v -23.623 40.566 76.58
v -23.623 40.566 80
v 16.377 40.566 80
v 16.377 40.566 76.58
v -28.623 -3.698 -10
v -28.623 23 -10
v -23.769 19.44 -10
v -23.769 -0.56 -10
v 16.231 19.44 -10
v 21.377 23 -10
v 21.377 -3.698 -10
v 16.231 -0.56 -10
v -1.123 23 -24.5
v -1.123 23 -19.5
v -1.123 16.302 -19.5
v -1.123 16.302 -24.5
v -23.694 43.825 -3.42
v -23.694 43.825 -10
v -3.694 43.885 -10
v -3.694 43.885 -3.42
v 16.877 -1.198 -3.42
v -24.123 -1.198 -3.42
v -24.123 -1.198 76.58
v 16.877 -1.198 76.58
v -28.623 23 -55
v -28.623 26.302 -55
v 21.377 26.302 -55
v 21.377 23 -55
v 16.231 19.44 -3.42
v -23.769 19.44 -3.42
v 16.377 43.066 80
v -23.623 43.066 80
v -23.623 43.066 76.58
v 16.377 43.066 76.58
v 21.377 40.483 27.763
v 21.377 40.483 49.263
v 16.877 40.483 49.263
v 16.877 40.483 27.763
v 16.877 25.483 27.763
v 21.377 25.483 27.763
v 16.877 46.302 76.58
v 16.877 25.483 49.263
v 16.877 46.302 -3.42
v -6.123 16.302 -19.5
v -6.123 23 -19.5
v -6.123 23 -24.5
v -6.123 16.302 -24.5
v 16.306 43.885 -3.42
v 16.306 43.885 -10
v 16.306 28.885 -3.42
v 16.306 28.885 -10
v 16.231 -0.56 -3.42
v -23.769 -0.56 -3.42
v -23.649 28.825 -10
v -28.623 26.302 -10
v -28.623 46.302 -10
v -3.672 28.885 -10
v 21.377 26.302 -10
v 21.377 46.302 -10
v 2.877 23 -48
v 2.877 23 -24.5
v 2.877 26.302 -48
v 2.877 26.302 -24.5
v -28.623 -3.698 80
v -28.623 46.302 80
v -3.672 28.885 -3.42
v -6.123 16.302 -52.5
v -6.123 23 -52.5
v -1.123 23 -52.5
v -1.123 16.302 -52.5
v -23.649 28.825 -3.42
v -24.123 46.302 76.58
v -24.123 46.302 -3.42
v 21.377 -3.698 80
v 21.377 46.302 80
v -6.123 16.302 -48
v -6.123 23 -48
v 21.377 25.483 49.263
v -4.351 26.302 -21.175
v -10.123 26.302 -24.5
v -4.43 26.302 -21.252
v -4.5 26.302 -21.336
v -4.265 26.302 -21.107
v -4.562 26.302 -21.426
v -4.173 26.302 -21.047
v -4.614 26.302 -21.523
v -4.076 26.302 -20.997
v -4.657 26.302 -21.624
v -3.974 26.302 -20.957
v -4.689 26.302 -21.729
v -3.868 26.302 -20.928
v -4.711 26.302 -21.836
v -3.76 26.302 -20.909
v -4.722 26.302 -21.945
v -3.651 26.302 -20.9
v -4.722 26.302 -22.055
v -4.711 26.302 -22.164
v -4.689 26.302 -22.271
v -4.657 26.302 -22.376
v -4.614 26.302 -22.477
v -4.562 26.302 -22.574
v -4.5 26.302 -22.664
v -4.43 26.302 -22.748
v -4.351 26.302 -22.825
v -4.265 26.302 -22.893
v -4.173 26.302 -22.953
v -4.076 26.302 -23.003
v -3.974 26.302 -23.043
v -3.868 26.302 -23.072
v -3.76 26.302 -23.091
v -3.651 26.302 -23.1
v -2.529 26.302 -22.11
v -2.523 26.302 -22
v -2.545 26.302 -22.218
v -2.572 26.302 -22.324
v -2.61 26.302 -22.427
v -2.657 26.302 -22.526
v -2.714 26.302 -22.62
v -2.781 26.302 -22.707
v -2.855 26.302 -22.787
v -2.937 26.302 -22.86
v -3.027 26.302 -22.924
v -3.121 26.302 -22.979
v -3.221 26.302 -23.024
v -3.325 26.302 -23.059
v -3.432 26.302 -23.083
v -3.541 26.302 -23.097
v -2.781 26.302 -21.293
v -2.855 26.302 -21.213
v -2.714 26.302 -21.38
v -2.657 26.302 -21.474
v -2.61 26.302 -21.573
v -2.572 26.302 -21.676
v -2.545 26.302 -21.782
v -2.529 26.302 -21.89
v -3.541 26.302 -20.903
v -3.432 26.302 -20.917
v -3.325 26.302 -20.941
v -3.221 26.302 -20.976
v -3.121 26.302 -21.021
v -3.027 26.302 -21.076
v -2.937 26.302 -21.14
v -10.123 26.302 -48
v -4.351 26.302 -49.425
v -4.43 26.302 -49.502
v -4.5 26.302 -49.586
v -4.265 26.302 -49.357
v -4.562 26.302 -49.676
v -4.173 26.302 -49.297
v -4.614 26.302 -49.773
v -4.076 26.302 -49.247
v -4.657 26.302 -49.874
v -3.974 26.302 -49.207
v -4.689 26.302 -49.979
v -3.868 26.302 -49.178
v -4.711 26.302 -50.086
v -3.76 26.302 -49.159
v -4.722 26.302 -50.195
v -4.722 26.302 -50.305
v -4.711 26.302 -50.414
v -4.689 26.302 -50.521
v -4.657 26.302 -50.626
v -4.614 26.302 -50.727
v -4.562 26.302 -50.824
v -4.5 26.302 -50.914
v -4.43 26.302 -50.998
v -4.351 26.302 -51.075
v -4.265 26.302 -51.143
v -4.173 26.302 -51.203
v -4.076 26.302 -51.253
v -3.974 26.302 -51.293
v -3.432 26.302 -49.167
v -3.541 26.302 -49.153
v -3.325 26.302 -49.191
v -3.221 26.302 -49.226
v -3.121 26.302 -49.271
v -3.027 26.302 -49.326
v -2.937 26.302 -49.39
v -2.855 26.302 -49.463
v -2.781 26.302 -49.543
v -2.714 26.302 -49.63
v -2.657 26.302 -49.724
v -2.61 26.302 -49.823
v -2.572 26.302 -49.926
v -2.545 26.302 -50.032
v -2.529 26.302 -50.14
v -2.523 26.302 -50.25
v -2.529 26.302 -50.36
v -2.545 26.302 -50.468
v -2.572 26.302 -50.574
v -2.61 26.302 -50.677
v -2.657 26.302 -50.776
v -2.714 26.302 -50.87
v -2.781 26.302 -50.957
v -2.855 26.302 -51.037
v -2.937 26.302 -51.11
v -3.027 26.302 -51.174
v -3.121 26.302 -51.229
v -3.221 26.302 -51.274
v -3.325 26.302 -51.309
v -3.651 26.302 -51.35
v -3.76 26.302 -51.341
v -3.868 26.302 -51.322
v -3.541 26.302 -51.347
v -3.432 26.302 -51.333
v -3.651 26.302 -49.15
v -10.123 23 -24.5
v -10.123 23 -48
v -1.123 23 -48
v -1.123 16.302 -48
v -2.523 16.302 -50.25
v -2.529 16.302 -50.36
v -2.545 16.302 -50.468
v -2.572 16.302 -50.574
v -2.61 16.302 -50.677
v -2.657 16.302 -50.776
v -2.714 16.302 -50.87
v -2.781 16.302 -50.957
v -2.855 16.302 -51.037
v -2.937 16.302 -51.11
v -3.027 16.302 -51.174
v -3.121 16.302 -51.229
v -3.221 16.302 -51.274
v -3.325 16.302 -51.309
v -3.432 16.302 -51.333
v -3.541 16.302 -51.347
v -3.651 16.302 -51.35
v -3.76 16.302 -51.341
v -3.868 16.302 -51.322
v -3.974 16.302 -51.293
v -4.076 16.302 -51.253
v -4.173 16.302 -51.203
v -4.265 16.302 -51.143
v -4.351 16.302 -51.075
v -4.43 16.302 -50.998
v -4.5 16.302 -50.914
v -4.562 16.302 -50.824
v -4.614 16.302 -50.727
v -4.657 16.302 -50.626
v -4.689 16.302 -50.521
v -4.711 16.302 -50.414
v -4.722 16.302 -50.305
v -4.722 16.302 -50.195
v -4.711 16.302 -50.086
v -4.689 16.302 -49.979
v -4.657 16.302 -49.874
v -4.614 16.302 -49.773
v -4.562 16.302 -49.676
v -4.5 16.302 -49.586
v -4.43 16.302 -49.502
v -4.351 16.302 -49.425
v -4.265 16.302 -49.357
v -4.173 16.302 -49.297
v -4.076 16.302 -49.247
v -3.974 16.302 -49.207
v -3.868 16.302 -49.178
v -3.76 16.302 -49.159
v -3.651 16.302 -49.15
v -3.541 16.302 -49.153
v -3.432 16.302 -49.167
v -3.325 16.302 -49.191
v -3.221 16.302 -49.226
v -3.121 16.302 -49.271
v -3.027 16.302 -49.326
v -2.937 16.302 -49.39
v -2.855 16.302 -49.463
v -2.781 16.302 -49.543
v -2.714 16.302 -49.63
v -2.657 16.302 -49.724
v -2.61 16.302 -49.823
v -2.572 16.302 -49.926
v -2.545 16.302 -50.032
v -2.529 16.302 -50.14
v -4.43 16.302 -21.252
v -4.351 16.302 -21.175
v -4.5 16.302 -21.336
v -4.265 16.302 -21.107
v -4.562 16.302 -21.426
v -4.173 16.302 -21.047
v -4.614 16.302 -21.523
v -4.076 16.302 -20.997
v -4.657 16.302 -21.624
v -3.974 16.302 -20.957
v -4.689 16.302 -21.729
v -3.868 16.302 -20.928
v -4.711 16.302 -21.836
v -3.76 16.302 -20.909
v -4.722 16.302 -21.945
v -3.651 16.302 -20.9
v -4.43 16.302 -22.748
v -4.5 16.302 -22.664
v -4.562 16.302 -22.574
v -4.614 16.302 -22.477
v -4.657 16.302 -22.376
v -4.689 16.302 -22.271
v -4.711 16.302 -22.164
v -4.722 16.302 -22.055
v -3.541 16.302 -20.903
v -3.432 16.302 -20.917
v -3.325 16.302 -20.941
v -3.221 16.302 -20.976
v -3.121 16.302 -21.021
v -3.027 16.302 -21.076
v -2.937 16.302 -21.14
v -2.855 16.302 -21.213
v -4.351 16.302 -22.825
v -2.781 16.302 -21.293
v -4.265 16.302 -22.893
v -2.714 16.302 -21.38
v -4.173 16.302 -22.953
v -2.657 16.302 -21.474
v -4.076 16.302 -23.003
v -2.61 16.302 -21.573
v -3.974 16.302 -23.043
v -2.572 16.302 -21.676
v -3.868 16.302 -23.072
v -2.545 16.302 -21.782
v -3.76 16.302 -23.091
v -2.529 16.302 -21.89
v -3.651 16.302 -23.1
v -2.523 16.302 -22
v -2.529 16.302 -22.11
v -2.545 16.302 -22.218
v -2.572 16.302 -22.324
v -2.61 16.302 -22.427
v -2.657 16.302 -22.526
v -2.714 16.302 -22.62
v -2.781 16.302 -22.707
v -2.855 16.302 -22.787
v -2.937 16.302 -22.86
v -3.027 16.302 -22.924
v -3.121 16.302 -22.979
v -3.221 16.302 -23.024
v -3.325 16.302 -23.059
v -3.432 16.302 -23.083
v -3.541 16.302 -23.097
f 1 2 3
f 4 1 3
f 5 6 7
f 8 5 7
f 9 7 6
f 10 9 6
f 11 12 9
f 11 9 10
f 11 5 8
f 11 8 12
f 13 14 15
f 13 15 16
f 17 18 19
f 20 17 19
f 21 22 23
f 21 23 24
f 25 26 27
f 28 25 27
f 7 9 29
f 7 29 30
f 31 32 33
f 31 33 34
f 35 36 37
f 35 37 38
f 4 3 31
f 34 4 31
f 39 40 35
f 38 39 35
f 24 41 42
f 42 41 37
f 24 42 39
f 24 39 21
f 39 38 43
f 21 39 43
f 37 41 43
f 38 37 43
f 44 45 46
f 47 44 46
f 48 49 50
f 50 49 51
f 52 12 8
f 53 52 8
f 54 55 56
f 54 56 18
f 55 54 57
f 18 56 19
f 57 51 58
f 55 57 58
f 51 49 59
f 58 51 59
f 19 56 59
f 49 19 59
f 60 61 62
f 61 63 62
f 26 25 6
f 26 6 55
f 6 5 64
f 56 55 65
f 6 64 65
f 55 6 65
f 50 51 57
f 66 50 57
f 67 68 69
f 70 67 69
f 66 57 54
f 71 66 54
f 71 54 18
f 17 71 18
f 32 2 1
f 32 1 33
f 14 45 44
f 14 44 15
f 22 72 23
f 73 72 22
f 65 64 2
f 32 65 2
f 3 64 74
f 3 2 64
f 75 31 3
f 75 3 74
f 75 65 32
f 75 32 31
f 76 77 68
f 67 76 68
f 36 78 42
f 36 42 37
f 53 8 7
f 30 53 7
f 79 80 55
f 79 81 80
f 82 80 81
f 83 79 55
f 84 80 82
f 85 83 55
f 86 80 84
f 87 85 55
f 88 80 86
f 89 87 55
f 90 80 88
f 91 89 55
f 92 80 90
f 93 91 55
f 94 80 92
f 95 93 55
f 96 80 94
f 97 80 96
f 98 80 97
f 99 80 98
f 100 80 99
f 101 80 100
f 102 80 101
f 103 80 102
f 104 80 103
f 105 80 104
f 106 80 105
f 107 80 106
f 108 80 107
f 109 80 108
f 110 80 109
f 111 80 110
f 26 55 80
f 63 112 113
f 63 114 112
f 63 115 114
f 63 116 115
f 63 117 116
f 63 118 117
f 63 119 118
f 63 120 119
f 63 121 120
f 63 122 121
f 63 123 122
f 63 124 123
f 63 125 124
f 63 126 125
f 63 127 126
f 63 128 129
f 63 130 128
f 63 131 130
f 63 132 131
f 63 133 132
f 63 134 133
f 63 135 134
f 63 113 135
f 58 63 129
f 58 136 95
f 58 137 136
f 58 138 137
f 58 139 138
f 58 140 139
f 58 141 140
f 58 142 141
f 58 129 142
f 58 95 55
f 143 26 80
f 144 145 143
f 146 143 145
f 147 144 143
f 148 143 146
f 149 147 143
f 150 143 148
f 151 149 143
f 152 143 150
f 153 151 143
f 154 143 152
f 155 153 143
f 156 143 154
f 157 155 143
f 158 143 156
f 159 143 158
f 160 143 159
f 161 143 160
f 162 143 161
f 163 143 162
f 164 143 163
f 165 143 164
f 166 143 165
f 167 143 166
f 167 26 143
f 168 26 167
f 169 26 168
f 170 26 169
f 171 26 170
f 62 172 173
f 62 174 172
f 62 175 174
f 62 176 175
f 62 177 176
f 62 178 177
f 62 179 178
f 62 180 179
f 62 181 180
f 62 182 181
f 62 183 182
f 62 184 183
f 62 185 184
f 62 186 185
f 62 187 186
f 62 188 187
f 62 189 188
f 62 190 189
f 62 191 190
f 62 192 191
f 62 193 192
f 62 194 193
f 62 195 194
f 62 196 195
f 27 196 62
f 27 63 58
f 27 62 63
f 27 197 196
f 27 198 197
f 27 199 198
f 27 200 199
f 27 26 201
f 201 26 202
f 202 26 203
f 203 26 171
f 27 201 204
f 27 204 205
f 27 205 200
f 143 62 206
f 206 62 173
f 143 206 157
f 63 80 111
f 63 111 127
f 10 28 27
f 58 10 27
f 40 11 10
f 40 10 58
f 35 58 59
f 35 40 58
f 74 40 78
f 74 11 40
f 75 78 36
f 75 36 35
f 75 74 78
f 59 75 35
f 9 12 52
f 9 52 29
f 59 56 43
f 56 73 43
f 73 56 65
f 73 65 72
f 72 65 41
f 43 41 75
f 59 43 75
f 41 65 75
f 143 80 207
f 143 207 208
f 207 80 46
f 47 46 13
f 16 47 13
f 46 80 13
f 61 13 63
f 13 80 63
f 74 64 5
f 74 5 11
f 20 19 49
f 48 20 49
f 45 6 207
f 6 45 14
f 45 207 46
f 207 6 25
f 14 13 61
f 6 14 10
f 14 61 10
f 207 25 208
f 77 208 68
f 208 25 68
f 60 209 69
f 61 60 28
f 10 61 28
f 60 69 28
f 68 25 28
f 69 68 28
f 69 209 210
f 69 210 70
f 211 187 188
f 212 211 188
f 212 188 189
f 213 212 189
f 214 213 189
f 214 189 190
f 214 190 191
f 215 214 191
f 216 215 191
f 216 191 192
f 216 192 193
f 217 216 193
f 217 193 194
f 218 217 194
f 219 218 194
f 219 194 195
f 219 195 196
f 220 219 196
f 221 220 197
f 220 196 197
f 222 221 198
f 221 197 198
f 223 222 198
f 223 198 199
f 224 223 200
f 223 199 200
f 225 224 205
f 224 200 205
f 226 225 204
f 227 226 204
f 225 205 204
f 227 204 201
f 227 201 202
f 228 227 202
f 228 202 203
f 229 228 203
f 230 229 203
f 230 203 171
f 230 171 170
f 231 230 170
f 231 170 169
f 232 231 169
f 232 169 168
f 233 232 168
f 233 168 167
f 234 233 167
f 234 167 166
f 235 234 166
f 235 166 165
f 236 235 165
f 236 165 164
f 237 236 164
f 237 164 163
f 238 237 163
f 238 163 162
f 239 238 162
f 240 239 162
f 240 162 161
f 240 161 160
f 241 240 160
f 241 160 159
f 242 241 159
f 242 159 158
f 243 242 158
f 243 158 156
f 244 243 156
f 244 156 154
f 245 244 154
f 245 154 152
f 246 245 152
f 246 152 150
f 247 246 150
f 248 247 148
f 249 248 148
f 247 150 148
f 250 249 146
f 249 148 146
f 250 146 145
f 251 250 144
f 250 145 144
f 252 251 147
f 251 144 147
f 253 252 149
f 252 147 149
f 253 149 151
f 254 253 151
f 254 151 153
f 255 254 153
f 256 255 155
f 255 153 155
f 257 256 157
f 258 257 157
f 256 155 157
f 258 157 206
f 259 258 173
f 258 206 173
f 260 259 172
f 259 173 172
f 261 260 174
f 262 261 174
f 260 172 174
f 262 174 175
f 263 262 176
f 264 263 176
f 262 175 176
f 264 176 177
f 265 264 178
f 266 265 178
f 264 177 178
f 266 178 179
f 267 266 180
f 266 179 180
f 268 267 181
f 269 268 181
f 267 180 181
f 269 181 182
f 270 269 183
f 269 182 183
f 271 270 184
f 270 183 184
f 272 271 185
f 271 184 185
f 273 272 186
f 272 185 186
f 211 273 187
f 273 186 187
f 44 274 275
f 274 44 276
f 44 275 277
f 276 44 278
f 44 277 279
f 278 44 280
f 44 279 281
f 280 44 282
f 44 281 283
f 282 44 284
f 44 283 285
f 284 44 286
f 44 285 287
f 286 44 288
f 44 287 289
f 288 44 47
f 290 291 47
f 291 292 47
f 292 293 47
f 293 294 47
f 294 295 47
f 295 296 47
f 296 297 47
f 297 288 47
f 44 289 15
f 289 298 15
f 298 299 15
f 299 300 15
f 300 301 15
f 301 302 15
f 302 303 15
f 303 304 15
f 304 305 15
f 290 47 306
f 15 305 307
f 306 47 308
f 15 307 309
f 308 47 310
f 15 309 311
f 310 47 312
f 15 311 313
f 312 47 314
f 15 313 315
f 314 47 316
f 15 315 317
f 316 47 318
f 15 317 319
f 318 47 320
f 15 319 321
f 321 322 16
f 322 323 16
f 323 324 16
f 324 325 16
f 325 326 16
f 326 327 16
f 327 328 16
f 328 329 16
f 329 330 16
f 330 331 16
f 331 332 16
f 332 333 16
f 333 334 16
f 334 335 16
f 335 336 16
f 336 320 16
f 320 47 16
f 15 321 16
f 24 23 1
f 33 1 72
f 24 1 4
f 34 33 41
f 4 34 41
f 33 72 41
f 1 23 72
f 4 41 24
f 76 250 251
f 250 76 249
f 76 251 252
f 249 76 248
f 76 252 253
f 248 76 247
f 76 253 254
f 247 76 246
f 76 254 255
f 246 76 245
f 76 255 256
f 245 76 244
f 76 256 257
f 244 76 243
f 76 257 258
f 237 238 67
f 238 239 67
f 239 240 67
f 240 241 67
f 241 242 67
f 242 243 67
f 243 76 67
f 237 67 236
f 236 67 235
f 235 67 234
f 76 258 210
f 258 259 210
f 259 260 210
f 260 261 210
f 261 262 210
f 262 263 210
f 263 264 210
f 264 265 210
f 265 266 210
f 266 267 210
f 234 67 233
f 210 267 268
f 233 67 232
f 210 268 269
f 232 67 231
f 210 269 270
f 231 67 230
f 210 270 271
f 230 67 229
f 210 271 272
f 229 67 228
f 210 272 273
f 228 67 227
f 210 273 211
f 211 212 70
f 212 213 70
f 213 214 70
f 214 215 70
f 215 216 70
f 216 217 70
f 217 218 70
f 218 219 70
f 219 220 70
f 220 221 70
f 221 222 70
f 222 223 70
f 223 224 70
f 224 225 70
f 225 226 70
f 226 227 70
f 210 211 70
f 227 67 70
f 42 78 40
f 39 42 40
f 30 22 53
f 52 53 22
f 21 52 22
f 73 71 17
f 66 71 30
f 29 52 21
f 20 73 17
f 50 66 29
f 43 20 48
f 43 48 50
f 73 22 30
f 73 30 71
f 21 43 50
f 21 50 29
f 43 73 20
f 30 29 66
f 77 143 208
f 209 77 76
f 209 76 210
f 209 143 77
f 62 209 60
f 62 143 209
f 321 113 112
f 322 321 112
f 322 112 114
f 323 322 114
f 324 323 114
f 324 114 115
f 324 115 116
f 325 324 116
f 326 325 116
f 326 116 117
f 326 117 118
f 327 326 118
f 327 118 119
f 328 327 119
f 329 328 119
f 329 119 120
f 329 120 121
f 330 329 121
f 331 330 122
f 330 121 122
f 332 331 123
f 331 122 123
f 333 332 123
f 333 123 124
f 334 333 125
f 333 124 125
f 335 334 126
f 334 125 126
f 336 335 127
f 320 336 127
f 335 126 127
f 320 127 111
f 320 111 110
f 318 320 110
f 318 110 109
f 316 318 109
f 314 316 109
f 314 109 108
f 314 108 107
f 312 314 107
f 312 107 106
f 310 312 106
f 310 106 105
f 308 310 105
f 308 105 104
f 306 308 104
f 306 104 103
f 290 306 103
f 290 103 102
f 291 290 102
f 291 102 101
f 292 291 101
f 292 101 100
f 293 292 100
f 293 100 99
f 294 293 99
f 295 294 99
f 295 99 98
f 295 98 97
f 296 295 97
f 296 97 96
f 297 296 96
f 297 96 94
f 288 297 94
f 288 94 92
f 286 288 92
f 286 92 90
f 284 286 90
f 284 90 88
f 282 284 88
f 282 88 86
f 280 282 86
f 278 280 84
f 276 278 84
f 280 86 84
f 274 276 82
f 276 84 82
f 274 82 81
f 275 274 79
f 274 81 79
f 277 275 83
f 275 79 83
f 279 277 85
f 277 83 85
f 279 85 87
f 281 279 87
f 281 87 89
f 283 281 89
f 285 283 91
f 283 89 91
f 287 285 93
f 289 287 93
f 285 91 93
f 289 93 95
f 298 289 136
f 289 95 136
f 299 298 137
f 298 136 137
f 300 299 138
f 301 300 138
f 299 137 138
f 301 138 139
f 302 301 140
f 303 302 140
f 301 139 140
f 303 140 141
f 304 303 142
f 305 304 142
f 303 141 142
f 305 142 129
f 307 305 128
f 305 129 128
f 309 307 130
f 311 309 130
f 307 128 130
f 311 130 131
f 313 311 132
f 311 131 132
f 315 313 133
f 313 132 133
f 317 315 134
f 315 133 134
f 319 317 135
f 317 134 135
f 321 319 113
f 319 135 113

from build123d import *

# Parameters (mm, degrees)
SKETCH_1_W               = 50
SKETCH_1_H               = 50
EXTRUDE_1_DEPTH          = 80
EXTRUDE_1_DEPTH_BACK     = 55
SKETCH_2_W               = 41
SKETCH_2_H               = 80
CUT_EXTRUDE_1_DEPTH      = 47.5
SKETCH_3_W               = 13
SKETCH_3_H               = 23.5
CUT_EXTRUDE_2_DEPTH      = 60
CUT_EXTRUDE_2_DEPTH_BACK = 20
SKETCH_5_W               = 50
SKETCH_5_H               = 45
CUT_EXTRUDE_4_DEPTH      = 20
SKETCH_4_W               = 50
SKETCH_4_H               = 45
CUT_EXTRUDE_5_DEPTH      = 23
CUT_EXTRUDE_5_DEPTH_BACK = 10
CUT_EXTRUDE_6_DEPTH      = 10
SKETCH_7_W               = 40
SKETCH_7_H               = 20
CUT_EXTRUDE_7_DEPTH      = 10
SKETCH_9_W               = 40
SKETCH_9_H               = 2.5
CUT_EXTRUDE_8_DEPTH      = 10
SKETCH_11_W              = 5
SKETCH_11_H              = 4.5
SKETCH_11_H_2            = 5
EXTRUDE_4_DEPTH          = 10
SKETCH_13_W              = 21.5
SKETCH_13_H              = 15
CUT_EXTRUDE_10_DEPTH     = 15
SKETCH_14_R              = 1.1
CUT_EXTRUDE_11_DEPTH     = 12.4


with BuildPart() as part:
    # 草圖1 → 填料-伸長1 (new body, two sides)
    with BuildSketch(Plane.XY) as extrude_1_sk:
        with Locations((-3.62330355, 21.302402801)):
            Rectangle(SKETCH_1_W, SKETCH_1_H)
    extrude(amount=EXTRUDE_1_DEPTH)
    extrude(extrude_1_sk.sketch, amount=-EXTRUDE_1_DEPTH_BACK)

    # 草圖2 → 除料-伸長1 (cut)
    with BuildSketch(Plane(origin=(0, 46.302402801, 0), x_dir=(1, 0, 0), z_dir=(0, 1, 0))):
        with Locations((-3.62330355, -36.580275675)):
            Rectangle(SKETCH_2_W, SKETCH_2_H)
    extrude(amount=-CUT_EXTRUDE_1_DEPTH, mode=Mode.SUBTRACT)

    # 草圖3 → 除料-伸長2 (cut, two sides)
    with BuildSketch(Plane(origin=(0, 0, 0), x_dir=(1, 0, 0), z_dir=(0, 1, 0))) as cut_extrude_2_sk:
        with Locations((-3.62330355, 36.25)):
            Rectangle(SKETCH_3_W, SKETCH_3_H)
    extrude(amount=CUT_EXTRUDE_2_DEPTH, mode=Mode.SUBTRACT)
    extrude(cut_extrude_2_sk.sketch, amount=-CUT_EXTRUDE_2_DEPTH_BACK, mode=Mode.SUBTRACT)

    # 草圖5 → 除料-伸長4 (cut)
    with BuildSketch(Plane(origin=(0, 46.302402801, 0), x_dir=(1, 0, 0), z_dir=(0, 1, 0))):
        with Locations((-3.62330355, 32.5)):
            Rectangle(SKETCH_5_W, SKETCH_5_H)
    extrude(amount=-CUT_EXTRUDE_4_DEPTH, mode=Mode.SUBTRACT)

    # 草圖4 → 除料-伸長5 (cut, two sides)
    with BuildSketch(Plane(origin=(0, 0, 0), x_dir=(1, 0, 0), z_dir=(0, 1, 0))) as cut_extrude_5_sk:
        with Locations((-3.62330355, 32.5)):
            Rectangle(SKETCH_4_W, SKETCH_4_H)
    extrude(amount=CUT_EXTRUDE_5_DEPTH, mode=Mode.SUBTRACT)
    extrude(cut_extrude_5_sk.sketch, amount=-CUT_EXTRUDE_5_DEPTH_BACK, mode=Mode.SUBTRACT)

    # 草圖6 → 除料-伸長6 (cut)
    with BuildSketch(Plane(origin=(0, 0, -10), x_dir=(-1, 0, 0), z_dir=(0, 0, -1))):
        Polygon((3.693842319, 43.884561913), (-16.306157681, 43.884561913), (-16.306157681, 28.884561913), (3.67160538, 28.884561913), (23.649280632, 28.825329472), (23.693754411, 43.825263542), align=None)
    extrude(amount=-CUT_EXTRUDE_6_DEPTH, mode=Mode.SUBTRACT)

    # 草圖7 → 除料-伸長7 (cut)
    with BuildSketch(Plane(origin=(0, 0, -10), x_dir=(-1, 0, 0), z_dir=(0, 0, -1))):
        with Locations((3.768668362, 9.439500409)):
            Rectangle(SKETCH_7_W, SKETCH_7_H)
    extrude(amount=-CUT_EXTRUDE_7_DEPTH, mode=Mode.SUBTRACT)

    # 草圖9 → 除料-伸長8 (cut)
    with BuildSketch(Plane.XY.offset(80)):
        with Locations((-3.62330355, 41.816351076)):
            Rectangle(SKETCH_9_W, SKETCH_9_H)
    extrude(amount=-CUT_EXTRUDE_8_DEPTH, mode=Mode.SUBTRACT)

    # 草圖11 → 填料-伸長4 (add)
    with BuildSketch(Plane(origin=(0, 26.302402801, 0), x_dir=(1, 0, 0), z_dir=(0, 1, 0))):
        with Locations((-3.62330355, 50.25)):
            Rectangle(SKETCH_11_W, SKETCH_11_H)
        with Locations((-3.62330355, 22)):
            Rectangle(SKETCH_11_W, SKETCH_11_H_2)
    extrude(amount=-EXTRUDE_4_DEPTH)

    # 草圖13 → 除料-伸長10 (cut)
    with BuildSketch(Plane(origin=(21.37669645, 0, 0), x_dir=(0, 0, -1), z_dir=(1, 0, 0))):
        with Locations((-38.513161072, 32.983055623)):
            Rectangle(SKETCH_13_W, SKETCH_13_H)
    extrude(amount=-CUT_EXTRUDE_10_DEPTH, mode=Mode.SUBTRACT)

    # 草圖14 → 除料-伸長11 (cut)
    with BuildSketch(Plane(origin=(0, 26.302402801, 0), x_dir=(1, 0, 0), z_dir=(0, 1, 0))):
        with Locations((-3.62330355, 50.25)):
            Circle(SKETCH_14_R)
        with Locations((-3.62330355, 22)):
            Circle(SKETCH_14_R)
    extrude(amount=-CUT_EXTRUDE_11_DEPTH, mode=Mode.SUBTRACT)


solid = part.part
